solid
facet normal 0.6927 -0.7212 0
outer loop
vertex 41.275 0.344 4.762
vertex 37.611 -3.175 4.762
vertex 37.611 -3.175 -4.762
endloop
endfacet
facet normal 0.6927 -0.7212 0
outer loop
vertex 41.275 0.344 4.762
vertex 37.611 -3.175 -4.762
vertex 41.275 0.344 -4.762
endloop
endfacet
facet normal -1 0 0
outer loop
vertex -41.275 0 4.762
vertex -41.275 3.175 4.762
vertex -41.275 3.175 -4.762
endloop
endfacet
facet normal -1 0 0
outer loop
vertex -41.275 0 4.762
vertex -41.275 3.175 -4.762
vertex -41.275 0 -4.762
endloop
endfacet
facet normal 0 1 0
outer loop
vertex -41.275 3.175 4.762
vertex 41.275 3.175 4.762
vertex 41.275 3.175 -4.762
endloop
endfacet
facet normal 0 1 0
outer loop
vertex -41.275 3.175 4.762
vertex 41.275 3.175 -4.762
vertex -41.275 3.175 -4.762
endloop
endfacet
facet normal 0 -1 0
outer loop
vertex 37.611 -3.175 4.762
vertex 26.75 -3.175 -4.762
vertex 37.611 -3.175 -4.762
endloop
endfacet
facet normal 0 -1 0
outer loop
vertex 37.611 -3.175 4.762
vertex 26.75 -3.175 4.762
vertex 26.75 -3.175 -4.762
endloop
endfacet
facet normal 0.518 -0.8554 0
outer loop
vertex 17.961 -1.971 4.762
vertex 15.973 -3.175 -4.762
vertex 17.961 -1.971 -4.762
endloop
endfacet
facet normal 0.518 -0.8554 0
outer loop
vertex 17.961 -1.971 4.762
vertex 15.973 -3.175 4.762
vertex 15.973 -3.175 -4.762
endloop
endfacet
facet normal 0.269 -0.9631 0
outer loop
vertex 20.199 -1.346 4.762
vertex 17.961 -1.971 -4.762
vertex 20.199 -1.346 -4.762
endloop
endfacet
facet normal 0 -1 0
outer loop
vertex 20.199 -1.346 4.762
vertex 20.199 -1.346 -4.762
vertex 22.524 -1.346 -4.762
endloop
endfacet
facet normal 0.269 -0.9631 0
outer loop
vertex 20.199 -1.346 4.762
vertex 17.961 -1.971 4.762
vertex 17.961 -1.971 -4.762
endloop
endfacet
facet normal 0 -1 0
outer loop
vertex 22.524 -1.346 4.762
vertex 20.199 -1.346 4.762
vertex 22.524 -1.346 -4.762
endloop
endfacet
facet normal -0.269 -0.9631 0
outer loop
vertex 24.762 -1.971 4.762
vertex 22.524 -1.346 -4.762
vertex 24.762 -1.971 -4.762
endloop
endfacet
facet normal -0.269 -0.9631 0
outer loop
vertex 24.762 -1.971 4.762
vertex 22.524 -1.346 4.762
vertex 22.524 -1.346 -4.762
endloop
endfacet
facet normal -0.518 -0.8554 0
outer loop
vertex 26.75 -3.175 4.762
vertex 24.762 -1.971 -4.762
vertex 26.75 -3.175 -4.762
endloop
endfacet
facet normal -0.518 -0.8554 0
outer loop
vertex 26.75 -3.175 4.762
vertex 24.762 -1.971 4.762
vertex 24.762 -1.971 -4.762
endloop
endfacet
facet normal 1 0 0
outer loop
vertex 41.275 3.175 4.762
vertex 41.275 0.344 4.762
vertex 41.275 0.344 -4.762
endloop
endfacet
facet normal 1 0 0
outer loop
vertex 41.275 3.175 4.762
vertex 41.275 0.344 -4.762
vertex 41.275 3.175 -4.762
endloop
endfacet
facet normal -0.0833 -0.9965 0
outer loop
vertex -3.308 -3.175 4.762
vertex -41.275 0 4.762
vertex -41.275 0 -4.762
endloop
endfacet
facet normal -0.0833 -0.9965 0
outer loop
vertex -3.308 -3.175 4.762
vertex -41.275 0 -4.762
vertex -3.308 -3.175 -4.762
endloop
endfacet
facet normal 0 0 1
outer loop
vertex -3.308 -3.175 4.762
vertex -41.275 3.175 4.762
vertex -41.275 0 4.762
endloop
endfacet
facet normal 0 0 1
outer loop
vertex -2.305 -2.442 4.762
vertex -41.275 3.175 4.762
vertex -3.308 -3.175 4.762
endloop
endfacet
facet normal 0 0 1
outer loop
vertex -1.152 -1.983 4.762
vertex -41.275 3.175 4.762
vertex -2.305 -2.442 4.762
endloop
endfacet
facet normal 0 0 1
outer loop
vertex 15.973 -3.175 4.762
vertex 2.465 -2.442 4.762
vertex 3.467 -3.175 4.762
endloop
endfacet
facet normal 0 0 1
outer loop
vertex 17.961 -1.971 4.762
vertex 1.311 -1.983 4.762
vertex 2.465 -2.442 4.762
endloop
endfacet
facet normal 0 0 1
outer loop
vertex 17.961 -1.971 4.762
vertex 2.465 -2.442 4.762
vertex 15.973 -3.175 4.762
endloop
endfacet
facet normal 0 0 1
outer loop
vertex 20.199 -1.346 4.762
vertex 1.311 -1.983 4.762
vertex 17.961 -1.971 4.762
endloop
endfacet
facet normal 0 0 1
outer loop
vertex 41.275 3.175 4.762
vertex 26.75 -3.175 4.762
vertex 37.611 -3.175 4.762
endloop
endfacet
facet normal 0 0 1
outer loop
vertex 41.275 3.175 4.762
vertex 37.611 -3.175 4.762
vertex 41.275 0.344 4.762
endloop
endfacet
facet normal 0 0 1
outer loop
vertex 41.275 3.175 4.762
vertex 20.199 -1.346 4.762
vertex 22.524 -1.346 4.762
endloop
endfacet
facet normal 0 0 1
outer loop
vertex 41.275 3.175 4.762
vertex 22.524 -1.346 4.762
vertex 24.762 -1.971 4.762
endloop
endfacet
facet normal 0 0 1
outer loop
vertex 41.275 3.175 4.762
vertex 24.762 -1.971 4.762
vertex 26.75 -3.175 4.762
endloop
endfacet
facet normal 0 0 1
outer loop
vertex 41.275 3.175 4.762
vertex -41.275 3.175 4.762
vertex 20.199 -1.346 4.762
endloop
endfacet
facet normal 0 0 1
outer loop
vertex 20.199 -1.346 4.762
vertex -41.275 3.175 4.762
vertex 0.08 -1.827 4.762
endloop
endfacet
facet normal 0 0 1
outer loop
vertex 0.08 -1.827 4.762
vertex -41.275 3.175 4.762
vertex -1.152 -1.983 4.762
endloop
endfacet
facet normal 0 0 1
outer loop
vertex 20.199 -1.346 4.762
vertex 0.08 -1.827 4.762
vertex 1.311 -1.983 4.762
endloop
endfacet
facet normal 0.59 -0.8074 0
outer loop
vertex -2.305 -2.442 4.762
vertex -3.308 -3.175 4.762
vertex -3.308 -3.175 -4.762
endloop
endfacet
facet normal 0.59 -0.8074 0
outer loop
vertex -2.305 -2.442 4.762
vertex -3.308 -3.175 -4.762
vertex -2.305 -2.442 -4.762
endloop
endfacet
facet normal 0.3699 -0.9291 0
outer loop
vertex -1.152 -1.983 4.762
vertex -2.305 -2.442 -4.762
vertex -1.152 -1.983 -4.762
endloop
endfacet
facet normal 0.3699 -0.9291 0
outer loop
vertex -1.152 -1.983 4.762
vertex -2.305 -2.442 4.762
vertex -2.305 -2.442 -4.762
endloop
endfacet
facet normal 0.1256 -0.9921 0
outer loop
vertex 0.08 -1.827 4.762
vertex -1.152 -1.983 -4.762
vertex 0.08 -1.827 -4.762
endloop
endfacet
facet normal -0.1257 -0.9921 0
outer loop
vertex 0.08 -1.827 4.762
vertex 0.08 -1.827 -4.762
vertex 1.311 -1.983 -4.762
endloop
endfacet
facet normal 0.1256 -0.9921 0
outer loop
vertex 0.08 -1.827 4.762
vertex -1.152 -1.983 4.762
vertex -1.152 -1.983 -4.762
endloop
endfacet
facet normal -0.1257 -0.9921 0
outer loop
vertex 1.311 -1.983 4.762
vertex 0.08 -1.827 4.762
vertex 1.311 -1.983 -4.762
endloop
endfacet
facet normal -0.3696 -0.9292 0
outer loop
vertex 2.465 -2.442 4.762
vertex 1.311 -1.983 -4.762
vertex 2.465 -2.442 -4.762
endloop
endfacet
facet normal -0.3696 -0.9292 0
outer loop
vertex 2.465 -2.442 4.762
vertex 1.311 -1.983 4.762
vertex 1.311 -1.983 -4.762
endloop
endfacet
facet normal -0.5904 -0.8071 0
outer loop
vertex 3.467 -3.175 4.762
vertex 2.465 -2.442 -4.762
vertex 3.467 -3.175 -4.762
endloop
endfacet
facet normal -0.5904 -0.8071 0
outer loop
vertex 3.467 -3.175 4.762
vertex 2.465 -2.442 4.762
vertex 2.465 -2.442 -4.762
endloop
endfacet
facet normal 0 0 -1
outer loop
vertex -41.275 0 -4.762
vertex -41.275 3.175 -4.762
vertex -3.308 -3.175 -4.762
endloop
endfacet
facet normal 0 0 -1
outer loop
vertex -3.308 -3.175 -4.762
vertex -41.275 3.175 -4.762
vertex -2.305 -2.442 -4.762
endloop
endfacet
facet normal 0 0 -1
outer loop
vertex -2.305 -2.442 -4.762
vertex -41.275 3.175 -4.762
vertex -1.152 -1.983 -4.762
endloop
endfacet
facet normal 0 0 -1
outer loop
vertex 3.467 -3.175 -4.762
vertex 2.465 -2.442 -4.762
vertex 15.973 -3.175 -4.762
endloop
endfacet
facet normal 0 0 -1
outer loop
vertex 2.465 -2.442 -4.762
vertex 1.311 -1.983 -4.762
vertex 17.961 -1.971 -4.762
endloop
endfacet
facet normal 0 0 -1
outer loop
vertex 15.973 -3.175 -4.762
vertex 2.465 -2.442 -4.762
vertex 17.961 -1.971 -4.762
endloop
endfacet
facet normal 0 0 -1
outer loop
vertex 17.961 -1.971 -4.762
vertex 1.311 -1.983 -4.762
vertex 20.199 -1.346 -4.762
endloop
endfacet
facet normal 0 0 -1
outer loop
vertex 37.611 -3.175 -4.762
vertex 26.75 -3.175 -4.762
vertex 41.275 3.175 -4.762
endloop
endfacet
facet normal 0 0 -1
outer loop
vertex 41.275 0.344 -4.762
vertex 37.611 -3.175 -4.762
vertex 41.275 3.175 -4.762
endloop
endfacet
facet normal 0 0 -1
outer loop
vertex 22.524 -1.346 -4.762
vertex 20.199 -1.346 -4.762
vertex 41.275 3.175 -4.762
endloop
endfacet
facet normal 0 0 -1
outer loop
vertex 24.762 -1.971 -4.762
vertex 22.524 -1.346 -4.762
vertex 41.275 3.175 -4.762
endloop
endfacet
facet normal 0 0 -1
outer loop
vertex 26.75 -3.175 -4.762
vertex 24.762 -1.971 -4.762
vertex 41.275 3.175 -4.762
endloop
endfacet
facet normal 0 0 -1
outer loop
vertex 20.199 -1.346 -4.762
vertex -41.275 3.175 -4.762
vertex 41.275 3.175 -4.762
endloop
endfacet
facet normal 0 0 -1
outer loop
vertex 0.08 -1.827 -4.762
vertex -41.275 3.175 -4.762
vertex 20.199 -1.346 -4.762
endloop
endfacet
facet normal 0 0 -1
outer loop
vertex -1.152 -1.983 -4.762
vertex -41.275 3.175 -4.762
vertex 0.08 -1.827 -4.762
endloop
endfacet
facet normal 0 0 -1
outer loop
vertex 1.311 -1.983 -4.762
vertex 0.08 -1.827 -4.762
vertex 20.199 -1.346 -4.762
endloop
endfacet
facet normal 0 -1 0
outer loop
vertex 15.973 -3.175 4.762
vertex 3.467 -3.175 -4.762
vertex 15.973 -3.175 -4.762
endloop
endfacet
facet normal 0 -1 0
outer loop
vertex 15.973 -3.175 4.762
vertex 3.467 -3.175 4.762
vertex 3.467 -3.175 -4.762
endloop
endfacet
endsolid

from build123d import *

# Parameters (mm, degrees)
F1_DEPTH = 4.7625


with BuildPart() as f1:
    # F0 (on Top) → F1 (new body, symmetric)
    with BuildSketch(Plane.XY):
        with BuildLine():
            Line((26.7500709742, -3.175), (37.6112871062, -3.175))
            Line((37.6112871062, -3.175), (41.275, 0.3440350712))
            Line((41.275, 0.3440350712), (41.275, 3.175))
            Line((41.275, 3.175), (-41.275, 3.175))
            Line((-41.275, 3.175), (-41.275, 0))
            Line((-41.275, 0), (-3.3075221407, -3.175))
            ThreePointArc((-3.3075221407, -3.175), (0.0796335022, -1.82683754), (3.466789145, -3.175))
            Line((3.466789145, -3.175), (15.9728042781, -3.175))
            ThreePointArc((15.9728042781, -3.175), (21.3614376262, -1.2663040308), (26.7500709742, -3.175))
        make_face()
    extrude(amount=F1_DEPTH, both=True)


solid = f1.part
